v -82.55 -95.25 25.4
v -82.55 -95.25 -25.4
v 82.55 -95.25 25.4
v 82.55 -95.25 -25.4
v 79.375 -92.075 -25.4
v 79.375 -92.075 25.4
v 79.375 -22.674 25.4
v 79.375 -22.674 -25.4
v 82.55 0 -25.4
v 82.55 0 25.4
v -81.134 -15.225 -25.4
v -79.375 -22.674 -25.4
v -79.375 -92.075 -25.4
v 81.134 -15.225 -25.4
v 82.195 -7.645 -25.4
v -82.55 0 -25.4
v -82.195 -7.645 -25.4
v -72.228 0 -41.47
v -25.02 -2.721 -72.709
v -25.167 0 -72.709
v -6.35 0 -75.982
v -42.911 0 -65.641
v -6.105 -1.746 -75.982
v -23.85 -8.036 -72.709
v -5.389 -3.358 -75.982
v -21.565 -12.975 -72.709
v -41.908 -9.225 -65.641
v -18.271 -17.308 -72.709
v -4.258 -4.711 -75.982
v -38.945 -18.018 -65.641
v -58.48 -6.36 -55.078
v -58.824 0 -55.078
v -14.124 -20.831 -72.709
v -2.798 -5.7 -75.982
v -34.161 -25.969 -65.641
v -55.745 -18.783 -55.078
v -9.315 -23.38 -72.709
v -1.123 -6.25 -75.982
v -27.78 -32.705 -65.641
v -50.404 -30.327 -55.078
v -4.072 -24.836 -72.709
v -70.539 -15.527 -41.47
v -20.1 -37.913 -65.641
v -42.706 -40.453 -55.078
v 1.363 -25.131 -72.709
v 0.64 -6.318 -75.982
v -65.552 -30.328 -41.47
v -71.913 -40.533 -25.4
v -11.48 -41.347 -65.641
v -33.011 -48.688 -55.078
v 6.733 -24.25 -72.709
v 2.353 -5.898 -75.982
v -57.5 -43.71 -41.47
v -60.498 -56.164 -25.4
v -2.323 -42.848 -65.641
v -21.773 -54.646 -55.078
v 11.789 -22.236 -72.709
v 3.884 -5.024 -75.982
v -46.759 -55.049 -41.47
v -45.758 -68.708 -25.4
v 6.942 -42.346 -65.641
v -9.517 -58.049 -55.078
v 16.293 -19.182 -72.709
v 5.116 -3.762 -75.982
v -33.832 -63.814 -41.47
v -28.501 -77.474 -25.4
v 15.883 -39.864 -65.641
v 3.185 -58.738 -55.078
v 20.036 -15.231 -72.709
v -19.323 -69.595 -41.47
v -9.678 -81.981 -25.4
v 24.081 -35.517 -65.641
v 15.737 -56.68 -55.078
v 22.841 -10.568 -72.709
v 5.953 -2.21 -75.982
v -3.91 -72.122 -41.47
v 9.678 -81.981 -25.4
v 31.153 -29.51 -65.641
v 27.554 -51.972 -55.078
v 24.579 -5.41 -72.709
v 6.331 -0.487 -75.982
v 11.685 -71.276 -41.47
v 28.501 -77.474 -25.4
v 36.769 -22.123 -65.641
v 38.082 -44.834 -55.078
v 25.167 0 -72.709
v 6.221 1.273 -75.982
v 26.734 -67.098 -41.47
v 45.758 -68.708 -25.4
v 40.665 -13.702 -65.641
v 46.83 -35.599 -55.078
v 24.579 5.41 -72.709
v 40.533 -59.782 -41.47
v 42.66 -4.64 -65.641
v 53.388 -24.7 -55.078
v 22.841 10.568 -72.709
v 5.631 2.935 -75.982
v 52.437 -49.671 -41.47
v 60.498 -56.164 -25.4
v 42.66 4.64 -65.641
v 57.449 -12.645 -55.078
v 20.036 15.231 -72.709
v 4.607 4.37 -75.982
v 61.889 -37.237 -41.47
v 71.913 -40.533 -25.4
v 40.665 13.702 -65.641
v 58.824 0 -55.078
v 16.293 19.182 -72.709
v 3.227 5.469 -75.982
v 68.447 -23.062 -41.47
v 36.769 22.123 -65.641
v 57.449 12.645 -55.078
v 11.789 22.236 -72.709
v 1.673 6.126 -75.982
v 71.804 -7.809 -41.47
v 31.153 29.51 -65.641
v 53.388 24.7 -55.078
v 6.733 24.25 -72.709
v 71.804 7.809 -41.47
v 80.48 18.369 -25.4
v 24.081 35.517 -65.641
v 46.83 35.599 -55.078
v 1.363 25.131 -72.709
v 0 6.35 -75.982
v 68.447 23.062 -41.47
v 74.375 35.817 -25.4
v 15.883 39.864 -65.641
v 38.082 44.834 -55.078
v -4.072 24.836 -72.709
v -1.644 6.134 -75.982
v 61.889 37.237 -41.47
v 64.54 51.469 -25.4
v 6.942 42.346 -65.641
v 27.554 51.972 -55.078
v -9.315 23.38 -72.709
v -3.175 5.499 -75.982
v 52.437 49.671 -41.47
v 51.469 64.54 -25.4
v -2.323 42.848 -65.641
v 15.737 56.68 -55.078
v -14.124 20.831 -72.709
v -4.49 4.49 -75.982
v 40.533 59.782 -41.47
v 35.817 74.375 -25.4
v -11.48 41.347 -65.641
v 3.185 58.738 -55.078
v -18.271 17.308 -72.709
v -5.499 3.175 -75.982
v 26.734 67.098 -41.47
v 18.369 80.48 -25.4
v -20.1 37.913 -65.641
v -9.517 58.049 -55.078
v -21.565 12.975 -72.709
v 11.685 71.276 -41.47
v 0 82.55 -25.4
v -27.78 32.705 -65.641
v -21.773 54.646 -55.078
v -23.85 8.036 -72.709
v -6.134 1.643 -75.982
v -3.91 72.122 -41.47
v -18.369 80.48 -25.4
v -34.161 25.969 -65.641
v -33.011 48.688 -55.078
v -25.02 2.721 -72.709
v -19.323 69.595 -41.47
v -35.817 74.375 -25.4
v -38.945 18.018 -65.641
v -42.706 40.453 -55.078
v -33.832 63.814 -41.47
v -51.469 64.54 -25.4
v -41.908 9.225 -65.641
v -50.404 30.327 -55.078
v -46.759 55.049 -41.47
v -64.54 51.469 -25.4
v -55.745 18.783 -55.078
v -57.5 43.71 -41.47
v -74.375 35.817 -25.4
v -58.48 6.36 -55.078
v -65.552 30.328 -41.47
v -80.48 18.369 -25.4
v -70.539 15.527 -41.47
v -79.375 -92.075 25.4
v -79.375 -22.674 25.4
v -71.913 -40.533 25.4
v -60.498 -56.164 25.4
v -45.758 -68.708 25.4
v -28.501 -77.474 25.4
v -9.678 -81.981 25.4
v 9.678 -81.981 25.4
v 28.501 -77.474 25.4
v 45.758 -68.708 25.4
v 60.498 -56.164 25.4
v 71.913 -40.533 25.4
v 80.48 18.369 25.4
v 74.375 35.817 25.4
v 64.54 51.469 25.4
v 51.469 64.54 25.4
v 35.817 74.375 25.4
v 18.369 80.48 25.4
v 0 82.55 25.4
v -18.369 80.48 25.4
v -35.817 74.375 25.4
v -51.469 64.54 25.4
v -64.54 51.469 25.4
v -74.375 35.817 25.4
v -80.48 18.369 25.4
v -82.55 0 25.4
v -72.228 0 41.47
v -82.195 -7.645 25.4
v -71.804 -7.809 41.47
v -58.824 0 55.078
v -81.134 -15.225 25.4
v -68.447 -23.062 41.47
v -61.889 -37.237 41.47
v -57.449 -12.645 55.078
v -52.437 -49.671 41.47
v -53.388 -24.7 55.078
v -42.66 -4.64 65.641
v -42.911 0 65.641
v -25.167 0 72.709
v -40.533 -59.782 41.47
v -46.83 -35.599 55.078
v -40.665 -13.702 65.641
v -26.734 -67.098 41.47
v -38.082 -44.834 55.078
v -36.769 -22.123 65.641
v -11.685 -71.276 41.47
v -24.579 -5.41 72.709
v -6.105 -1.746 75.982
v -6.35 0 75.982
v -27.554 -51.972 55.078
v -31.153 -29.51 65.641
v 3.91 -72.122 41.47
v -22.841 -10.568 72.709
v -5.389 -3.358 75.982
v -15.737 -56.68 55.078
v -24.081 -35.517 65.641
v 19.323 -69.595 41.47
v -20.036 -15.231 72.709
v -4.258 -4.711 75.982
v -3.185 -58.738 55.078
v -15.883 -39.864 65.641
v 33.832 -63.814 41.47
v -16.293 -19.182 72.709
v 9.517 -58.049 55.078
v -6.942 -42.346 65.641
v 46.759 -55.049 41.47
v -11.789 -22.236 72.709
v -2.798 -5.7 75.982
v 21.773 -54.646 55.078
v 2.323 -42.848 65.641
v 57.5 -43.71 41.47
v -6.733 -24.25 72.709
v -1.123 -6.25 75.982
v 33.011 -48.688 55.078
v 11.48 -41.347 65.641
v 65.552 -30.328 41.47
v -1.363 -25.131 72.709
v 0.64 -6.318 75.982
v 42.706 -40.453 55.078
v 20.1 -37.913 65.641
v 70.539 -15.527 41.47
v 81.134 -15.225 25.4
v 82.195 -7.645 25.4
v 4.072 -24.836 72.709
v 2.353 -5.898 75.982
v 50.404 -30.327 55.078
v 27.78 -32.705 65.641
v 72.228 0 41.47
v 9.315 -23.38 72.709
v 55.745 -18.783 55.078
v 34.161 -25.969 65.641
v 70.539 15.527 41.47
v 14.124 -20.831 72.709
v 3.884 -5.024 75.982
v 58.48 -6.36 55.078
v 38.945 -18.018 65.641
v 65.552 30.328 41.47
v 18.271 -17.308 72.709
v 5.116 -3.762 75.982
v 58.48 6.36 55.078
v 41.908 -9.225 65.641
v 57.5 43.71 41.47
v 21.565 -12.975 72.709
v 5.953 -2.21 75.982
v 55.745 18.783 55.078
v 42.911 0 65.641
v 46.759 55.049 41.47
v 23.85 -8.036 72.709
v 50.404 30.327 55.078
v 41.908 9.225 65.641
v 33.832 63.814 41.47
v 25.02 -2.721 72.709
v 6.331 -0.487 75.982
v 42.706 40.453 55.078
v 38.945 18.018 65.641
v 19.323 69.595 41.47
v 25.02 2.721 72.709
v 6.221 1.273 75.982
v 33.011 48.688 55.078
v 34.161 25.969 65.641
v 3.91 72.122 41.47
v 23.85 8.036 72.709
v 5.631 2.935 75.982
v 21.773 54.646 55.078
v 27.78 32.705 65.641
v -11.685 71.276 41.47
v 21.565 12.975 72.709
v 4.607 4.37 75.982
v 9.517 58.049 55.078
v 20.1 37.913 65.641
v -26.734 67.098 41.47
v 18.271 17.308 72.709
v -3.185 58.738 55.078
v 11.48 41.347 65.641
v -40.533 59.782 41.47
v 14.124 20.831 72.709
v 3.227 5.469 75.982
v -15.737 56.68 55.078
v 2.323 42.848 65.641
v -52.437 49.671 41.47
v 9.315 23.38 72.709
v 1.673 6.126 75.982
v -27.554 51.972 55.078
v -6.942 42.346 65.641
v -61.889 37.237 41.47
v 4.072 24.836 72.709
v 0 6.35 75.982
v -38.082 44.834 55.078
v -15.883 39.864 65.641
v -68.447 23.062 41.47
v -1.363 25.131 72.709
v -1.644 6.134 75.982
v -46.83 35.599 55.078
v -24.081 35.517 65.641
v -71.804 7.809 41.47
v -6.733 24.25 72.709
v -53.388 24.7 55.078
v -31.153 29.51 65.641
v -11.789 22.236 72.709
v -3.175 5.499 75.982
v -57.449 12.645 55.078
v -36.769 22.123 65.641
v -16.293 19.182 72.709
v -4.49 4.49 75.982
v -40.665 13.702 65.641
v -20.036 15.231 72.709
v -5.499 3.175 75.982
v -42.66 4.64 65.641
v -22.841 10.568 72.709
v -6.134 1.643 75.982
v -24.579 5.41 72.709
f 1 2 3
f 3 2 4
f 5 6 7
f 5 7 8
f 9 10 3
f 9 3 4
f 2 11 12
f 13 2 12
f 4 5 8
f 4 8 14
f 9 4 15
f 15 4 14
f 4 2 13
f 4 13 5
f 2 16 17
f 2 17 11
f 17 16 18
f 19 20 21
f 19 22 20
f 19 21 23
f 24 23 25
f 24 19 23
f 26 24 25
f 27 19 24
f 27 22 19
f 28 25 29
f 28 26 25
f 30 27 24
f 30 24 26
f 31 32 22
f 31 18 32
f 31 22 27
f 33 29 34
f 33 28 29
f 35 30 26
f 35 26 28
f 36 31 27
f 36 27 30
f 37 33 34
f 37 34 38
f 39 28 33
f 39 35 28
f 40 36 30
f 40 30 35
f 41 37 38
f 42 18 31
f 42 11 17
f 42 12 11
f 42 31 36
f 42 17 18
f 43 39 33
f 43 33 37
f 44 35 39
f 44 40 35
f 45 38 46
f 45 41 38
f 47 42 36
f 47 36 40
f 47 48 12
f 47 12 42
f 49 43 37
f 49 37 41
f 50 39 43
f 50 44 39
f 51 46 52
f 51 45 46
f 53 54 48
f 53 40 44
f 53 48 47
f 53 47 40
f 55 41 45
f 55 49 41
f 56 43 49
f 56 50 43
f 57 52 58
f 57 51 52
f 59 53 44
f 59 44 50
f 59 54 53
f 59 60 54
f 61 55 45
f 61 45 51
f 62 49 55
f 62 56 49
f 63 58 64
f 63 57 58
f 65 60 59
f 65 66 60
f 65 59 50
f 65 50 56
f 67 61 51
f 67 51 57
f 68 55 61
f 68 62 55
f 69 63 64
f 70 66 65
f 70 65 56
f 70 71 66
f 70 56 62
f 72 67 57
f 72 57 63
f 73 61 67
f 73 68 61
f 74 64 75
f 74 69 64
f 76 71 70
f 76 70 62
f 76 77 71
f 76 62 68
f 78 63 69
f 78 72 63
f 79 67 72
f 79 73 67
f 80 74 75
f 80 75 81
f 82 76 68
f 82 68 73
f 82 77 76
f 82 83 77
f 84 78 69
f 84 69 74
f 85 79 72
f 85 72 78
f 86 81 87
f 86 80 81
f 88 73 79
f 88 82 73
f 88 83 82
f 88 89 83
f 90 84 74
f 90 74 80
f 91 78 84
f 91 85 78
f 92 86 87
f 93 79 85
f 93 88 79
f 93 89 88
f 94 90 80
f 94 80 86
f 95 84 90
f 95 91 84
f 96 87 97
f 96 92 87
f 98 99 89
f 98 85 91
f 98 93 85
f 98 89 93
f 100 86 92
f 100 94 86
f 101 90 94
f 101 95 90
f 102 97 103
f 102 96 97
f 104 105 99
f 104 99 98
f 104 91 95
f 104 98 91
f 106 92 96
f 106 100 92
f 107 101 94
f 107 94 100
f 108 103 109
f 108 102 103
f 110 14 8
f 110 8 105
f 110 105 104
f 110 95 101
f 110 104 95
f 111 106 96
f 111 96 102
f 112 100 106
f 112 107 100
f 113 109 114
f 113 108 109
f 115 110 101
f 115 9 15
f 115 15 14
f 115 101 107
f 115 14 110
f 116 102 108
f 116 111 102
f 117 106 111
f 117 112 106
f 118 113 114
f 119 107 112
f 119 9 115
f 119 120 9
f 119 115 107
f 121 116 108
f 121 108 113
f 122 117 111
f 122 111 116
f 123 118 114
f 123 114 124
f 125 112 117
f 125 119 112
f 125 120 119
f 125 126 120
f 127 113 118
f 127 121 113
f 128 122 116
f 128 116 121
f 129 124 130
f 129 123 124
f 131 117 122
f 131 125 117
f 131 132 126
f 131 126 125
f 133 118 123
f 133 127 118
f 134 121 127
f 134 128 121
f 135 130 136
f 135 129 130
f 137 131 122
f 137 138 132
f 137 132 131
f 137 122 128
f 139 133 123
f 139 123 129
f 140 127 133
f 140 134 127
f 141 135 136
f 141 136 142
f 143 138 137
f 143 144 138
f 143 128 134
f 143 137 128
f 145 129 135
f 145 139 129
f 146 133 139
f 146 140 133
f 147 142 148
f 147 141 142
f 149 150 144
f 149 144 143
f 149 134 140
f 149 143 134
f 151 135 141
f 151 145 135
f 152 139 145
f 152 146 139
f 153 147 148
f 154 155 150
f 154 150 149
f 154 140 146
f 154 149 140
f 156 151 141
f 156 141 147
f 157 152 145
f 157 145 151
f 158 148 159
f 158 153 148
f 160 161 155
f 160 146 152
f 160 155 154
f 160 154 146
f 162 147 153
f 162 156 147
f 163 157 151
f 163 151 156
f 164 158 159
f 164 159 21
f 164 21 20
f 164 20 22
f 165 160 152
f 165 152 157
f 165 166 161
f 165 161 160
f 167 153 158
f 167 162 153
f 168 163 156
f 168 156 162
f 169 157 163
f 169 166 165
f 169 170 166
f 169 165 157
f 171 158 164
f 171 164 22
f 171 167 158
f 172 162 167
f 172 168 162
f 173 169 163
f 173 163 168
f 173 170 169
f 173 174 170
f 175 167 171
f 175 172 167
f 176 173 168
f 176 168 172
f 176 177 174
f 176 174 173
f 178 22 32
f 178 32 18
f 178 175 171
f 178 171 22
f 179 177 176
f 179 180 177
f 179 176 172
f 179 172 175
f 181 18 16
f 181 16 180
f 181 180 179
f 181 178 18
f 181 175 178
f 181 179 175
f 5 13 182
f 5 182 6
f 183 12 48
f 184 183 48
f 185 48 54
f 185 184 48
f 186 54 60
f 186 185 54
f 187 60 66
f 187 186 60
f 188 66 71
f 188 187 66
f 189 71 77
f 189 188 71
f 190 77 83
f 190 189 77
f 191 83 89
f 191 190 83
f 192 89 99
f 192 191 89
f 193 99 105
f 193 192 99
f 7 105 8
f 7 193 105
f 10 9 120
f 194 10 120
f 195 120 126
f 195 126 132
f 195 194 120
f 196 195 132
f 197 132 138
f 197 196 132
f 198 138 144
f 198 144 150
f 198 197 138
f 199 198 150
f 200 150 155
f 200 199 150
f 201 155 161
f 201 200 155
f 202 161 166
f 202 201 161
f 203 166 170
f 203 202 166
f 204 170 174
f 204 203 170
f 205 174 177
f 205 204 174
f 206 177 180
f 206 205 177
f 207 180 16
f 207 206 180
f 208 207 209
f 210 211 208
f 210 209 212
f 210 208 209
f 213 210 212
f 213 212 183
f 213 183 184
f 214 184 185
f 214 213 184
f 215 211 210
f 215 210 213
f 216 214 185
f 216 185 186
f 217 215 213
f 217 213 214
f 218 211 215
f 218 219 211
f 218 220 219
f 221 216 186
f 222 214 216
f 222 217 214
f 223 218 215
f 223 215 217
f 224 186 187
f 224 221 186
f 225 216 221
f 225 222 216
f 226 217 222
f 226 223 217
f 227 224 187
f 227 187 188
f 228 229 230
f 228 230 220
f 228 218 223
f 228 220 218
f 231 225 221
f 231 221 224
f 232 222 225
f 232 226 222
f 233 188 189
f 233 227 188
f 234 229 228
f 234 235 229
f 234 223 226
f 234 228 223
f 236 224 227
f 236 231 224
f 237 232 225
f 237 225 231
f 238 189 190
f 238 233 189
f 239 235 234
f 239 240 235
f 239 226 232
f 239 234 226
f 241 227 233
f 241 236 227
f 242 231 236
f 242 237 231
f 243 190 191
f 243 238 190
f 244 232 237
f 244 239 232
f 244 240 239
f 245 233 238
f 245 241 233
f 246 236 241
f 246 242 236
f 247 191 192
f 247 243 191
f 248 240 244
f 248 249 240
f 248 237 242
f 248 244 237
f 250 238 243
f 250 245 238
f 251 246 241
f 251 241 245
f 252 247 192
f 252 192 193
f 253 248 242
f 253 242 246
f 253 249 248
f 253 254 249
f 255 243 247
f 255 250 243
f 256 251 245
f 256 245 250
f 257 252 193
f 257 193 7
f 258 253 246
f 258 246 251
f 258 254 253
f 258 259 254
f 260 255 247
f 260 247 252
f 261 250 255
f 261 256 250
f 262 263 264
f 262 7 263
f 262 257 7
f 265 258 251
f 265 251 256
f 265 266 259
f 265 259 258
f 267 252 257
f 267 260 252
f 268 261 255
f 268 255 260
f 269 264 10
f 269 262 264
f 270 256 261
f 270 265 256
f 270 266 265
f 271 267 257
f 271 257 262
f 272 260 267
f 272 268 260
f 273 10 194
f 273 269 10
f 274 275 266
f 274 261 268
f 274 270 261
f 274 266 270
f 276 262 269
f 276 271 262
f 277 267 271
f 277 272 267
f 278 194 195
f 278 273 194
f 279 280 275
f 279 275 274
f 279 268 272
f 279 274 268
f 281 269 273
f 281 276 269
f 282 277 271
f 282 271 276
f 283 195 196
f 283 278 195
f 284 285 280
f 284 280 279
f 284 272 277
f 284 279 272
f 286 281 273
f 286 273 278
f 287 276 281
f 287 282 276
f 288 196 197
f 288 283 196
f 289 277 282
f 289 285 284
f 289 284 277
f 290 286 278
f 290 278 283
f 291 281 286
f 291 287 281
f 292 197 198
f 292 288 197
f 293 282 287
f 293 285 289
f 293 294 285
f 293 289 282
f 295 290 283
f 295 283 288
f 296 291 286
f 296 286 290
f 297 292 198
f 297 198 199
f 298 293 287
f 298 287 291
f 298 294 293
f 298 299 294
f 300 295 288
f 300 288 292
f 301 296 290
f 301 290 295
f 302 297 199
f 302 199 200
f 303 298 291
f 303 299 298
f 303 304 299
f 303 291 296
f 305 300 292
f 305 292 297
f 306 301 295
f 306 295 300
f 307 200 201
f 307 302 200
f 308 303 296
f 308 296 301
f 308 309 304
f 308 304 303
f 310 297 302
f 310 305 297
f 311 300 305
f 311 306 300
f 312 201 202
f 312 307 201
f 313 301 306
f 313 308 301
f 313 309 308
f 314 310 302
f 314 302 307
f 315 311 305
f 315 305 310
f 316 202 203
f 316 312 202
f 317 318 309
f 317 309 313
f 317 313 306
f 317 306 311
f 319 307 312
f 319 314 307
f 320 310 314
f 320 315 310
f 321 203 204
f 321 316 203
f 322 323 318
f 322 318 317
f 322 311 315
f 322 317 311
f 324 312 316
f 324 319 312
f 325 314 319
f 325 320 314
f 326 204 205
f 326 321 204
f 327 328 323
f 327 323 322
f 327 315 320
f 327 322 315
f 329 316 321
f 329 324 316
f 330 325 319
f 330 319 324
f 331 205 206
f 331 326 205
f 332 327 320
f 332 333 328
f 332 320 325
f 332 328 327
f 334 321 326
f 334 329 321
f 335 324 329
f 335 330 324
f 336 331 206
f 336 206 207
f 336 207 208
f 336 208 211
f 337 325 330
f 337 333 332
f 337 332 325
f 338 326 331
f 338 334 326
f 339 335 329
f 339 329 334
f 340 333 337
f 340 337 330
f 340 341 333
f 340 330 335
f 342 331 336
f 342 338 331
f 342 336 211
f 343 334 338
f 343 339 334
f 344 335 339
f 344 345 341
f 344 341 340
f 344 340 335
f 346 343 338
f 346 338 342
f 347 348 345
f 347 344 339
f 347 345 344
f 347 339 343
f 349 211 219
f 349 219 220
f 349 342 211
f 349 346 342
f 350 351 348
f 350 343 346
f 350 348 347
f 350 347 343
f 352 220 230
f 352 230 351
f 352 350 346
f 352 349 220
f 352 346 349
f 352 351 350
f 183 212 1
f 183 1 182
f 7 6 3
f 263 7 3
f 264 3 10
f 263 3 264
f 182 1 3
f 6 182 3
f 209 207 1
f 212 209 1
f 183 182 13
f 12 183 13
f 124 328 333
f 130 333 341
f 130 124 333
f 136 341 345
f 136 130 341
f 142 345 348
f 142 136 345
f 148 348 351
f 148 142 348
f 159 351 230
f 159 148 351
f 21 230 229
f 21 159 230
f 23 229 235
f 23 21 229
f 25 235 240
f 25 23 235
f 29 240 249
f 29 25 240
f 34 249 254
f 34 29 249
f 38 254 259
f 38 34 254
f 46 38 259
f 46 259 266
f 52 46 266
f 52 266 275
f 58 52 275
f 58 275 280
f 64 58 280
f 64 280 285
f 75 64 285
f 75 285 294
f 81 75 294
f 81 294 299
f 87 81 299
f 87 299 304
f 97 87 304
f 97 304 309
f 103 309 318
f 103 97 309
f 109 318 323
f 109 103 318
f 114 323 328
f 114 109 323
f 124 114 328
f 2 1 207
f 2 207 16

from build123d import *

# Parameters (mm, degrees)
CUT_EXTRUDE1_DEPTH       = 140.411064841
CUT_EXTRUDE1_DEPTH_BACK  = 140.411064841
SKETCH2_R                = 6.35
SKETCH3_W                = 165.1
SKETCH3_H                = 50.8
BOSS_EXTRUDE1_DEPTH      = 3.175
BOSS_EXTRUDE2_REACH      = 209.561
BOSS_EXTRUDE2_END_RADIUS = 82.55
SKETCH5_W                = 3.175
SKETCH5_H                = 50.8


with BuildPart() as part:
    # Sketch1 → Revolve1 (revolve)
    with BuildSketch(Plane(origin=(0, 0, 0), x_dir=(0, 0, -1), z_dir=(1, 0, 0)), mode=Mode.PRIVATE) as revolve1_sk:
        with BuildLine():
            Line((25.4, 82.55), (-25.4, 82.55))
            ThreePointArc((-25.4, 82.55), (-62.482566405, 48.464271634), (-76.2, 0))
            Line((-76.2, 0), (76.2, 0))
            ThreePointArc((76.2, 0), (62.482566405, 48.464271634), (25.4, 82.55))
        make_face()
    revolve(revolve1_sk.sketch.rotate(Axis((0, 0, -76.2), (0, 0, 1)), 90), axis=Axis((0, 0, -76.2), (0, 0, 1)))

    # Sketch2 → Cut-Extrude1 (cut, two sides: drawn at the far end of the back side and taken through both)
    with BuildSketch(Plane.XY.offset(-CUT_EXTRUDE1_DEPTH_BACK)):
        with Locations(Location((0, 0, 0), (0, 0, 90))):
            Circle(SKETCH2_R)
    extrude(amount=CUT_EXTRUDE1_DEPTH + CUT_EXTRUDE1_DEPTH_BACK, mode=Mode.SUBTRACT)



with BuildPart() as body_2:
    # Sketch3 → Boss-Extrude1 (new body)
    with BuildSketch(Plane(origin=(0, -95.25, 0), x_dir=(1, 0, 0), z_dir=(0, 1, 0))):
        Rectangle(SKETCH3_W, SKETCH3_H)
    extrude(amount=BOSS_EXTRUDE1_DEPTH)


with BuildPart() as part_1:
    add(part.part)

    add(body_2.part)  # Boss-Extrude2 merges body 2
    # Boss-Extrude2: up to this cylinder (the profile starts outside it)
    boss_extrude2_end = Plane(origin=(0, 0, 0), z_dir=(0, 0, -1)) * Cylinder(BOSS_EXTRUDE2_END_RADIUS, 585.222, mode=Mode.PRIVATE)
    # Sketch5 → Boss-Extrude2 (add, up to the surface)
    with BuildSketch(Plane(origin=(0, -92.075, 0), x_dir=(1, 0, 0), z_dir=(0, 1, 0)), mode=Mode.PRIVATE) as boss_extrude2_sk1:
        with Locations((80.9625, 0)):
            Rectangle(SKETCH5_W, SKETCH5_H)
    boss_extrude2_tool1 = extrude(boss_extrude2_sk1.sketch, amount=BOSS_EXTRUDE2_REACH, mode=Mode.PRIVATE) - boss_extrude2_end
    add(boss_extrude2_tool1.solids().sort_by_distance((80.9625, -92.075, 0))[0])
    # Sketch5 → Boss-Extrude2 (add, up to the surface)
    with BuildSketch(Plane(origin=(0, -92.075, 0), x_dir=(1, 0, 0), z_dir=(0, 1, 0)), mode=Mode.PRIVATE) as boss_extrude2_sk2:
        with Locations((-80.9625, 0)):
            Rectangle(SKETCH5_W, SKETCH5_H)
    boss_extrude2_tool2 = extrude(boss_extrude2_sk2.sketch, amount=BOSS_EXTRUDE2_REACH, mode=Mode.PRIVATE) - boss_extrude2_end
    add(boss_extrude2_tool2.solids().sort_by_distance((-80.9625, -92.075, 0))[0])


solid = part_1.part
